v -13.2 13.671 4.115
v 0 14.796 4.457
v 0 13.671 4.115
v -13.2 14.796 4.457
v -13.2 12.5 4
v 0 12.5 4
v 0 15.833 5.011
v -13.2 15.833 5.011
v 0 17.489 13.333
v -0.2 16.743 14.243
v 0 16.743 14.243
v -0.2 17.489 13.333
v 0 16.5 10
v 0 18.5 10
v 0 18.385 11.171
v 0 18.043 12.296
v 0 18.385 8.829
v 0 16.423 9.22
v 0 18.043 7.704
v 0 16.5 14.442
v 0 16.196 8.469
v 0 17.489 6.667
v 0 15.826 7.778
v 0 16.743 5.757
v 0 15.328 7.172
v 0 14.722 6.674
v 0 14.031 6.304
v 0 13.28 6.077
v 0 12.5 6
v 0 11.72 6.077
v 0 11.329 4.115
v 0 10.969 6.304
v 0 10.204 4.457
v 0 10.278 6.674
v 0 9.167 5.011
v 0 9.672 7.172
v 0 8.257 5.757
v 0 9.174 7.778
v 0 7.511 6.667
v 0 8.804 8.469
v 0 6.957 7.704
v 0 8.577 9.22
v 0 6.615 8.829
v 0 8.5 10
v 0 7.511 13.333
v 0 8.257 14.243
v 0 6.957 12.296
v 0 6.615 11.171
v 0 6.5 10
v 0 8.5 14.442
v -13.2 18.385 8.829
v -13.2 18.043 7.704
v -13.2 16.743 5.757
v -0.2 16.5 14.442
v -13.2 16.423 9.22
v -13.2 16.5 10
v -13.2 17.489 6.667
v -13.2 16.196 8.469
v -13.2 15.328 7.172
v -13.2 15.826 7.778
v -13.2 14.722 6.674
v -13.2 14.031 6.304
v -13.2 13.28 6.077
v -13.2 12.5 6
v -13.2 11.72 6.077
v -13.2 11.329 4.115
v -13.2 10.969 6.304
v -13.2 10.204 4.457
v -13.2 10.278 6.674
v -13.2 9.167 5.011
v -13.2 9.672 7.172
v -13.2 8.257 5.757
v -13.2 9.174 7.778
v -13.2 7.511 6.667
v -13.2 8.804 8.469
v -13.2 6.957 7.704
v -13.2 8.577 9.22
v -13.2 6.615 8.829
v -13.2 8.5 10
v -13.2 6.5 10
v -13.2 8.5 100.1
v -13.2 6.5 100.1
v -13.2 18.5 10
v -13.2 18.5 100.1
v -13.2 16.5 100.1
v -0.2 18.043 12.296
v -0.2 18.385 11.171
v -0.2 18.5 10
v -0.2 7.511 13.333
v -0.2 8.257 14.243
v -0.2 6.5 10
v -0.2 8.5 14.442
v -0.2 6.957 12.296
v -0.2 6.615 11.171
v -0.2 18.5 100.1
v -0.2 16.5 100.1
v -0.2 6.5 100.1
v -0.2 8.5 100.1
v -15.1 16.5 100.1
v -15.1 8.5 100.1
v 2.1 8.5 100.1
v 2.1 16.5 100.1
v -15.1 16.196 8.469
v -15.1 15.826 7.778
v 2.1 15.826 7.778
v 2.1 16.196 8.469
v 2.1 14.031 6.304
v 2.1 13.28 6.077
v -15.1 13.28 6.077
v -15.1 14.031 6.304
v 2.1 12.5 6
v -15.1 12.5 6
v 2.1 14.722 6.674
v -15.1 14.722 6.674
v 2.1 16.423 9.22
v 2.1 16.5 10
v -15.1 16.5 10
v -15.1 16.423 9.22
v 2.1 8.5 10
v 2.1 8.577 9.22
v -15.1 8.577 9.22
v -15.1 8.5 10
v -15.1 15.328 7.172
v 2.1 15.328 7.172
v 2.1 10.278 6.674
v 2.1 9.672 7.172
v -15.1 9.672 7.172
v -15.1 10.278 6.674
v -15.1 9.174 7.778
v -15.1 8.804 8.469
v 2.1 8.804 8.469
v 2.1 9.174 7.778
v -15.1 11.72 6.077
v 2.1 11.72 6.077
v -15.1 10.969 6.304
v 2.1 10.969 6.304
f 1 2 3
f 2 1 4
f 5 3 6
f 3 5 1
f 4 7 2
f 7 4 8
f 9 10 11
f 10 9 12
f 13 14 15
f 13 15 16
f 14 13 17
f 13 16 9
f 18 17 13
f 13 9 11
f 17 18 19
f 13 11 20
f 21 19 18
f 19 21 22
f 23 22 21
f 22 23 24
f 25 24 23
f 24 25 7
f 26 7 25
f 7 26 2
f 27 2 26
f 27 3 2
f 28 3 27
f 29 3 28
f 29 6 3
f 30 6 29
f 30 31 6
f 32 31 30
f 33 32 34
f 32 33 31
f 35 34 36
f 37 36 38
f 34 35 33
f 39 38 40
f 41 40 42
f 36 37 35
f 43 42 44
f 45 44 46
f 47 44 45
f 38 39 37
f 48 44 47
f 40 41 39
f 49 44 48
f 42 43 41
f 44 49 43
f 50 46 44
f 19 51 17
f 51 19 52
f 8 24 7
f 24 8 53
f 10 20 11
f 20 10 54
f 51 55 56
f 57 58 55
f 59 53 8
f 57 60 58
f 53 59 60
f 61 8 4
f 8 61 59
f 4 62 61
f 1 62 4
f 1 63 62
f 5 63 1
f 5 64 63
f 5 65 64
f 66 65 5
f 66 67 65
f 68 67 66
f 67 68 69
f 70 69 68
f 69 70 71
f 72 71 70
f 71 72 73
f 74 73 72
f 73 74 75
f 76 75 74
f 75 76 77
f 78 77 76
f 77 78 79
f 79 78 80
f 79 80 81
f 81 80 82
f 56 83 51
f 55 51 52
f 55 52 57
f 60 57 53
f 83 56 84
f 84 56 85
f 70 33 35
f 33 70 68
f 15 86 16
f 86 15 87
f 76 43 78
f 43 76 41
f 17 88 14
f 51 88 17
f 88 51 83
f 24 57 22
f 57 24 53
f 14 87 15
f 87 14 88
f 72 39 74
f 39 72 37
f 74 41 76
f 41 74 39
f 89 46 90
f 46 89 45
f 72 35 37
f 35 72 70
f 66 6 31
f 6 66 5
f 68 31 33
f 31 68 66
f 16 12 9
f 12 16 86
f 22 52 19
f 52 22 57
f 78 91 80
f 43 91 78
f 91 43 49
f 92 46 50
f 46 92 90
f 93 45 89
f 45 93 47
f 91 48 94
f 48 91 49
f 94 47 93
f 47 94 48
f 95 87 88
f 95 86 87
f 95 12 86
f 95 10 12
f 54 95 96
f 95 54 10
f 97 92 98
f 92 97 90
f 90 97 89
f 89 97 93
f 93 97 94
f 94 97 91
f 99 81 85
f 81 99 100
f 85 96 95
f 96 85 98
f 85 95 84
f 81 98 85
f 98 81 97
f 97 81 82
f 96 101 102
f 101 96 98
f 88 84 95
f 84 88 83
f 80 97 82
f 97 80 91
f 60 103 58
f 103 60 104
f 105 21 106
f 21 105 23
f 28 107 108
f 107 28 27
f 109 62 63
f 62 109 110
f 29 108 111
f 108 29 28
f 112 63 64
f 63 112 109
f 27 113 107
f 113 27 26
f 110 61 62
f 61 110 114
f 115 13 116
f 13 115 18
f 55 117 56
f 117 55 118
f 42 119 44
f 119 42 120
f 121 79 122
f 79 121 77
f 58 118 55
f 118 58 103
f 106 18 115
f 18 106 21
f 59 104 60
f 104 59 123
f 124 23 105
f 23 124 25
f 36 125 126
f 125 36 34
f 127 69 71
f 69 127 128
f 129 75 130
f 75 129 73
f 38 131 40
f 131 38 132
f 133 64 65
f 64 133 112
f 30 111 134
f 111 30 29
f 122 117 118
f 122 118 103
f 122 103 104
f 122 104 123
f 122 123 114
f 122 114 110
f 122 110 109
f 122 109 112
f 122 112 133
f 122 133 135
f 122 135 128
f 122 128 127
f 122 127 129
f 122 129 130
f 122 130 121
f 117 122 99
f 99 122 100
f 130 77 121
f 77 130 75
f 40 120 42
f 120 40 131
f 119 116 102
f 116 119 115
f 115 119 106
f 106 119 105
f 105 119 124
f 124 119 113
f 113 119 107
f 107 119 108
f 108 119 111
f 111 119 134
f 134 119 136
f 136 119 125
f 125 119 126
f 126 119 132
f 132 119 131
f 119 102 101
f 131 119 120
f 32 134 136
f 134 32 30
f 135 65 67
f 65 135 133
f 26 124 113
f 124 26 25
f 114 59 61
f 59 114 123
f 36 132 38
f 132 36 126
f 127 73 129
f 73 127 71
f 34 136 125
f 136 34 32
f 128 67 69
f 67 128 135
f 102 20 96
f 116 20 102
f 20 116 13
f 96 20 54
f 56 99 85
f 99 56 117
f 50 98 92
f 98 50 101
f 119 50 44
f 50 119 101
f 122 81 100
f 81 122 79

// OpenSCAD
// file: chassis_base.scad
include <generic/lib.scad>;

function vChassisBaseDatasheet() =
     let(outer_diameter=350, thickness=2, inner_diameter=outer_diameter - 2 * thickness,
         base_height=100, cover_height=20, outer_height=base_height + cover_height,
         inner_height=outer_height - 2 * thickness)
     [["outer_diameter", outer_diameter], ["inner_diameter", inner_diameter],
      ["base_height", base_height], ["height", outer_height],
      ["inner_height", inner_height], ["thickness", thickness],
      ["support_diameter", 10], ["z_offset", 20], ["fillet_radius", 5]];

module mChassisOuterVolume() {
     datasheet = vChassisBaseDatasheet();
     rounded_cylinder(diameter=property(datasheet, "outer_diameter"),
                      height=property(datasheet, "height"),
                      fillet_radius=property(datasheet, "fillet_radius"));
}

module mChassisInnerVolume() {
     datasheet = vChassisBaseDatasheet();
     translate([0, 0, property(datasheet, "thickness")]) {
          rounded_cylinder(diameter=property(datasheet, "inner_diameter"),
                           height=property(datasheet, "inner_height"),
                           fillet_radius=property(datasheet, "fillet_radius"));
     }
}

module mChassisBBox() {
     datasheet = vChassisBaseDatasheet();
     chassis_height = property(datasheet, "height");
     chassis_outer_diameter = property(datasheet, "outer_diameter");
     translate([0., 0., chassis_height/2]) {
          cube([chassis_outer_diameter, chassis_outer_diameter, chassis_height], center=true);
     }
}

module mChassisShell() {
     difference() {
          mChassisOuterVolume();
          mChassisInnerVolume();
     }
}


module mChassisBase() {

}

mChassisBase();
// main file
include <generic/lib.scad>;

use <chassis_base.scad>;

kChassisBaseDatasheet = vChassisBaseDatasheet();

function vBumperSpringBlockBaseDatasheet() =
     let(thickness=property(kChassisBaseDatasheet, "thickness"),
         seat_thickness=3 * thickness, slot_width=5, spring_travel_distance=5,
         spring_max_length=spring_travel_distance + slot_width + 2 * seat_thickness)
     [["height", 20], ["width", 25], ["depth", 40], ["thickness", thickness], ["angular_offset", 70],
      ["spring_outer_diameter", 12], ["spring_inner_diameter", 8], ["spring_lock_size", 2 * thickness],
      ["spring_seat_thickness", seat_thickness], ["spring_slot_width", slot_width],
      ["spring_travel_distance", spring_travel_distance],
      ["spring_max_length", spring_max_length]];


module mBumperSpringBlockSeatComplement() {
     datasheet = vBumperSpringBlockBaseDatasheet();
     height = property(datasheet, "height");
     width = property(datasheet, "width");
     depth = property(datasheet, "depth");
     thickness = property(datasheet, "thickness");
     angular_offset = property(datasheet, "angular_offset");

     spring_outer_diameter = property(datasheet, "spring_outer_diameter");
     spring_inner_diameter = property(datasheet, "spring_inner_diameter");
     spring_lock_size = property(datasheet, "spring_lock_size");
     spring_seat_thickness = property(datasheet, "spring_seat_thickness");
     spring_slot_width = property(datasheet, "spring_slot_width");
     spring_travel_distance = property(datasheet, "spring_travel_distance");
     spring_max_length = property(datasheet, "spring_max_length");

     base_chassis_height = property(kChassisBaseDatasheet, "base_height");

     translate([spring_seat_thickness - spring_lock_size, width/2, height/2]) {
          rotate([0, 90, 0]) {
               translate([0, 0, -(spring_max_length - spring_slot_width) - kEpsilon]) {
                    cylinder(d=spring_inner_diameter, h=spring_max_length - spring_slot_width + 2 * kEpsilon);
                    translate([-(base_chassis_height - height/2) - kEpsilon, -spring_inner_diameter/2, 0]) {
                         cube([base_chassis_height - height/2 + kEpsilon, spring_inner_diameter,
                               spring_max_length - spring_slot_width + 2 * kEpsilon]);
                    }
                    translate([0, 0, spring_seat_thickness - spring_lock_size - kEpsilon]) {
                         cylinder(d=spring_outer_diameter, h=spring_max_length - spring_slot_width - 2 * (spring_seat_thickness - spring_lock_size) + 2 * kEpsilon);
                         translate([-(base_chassis_height - height/2) - kEpsilon, -spring_outer_diameter/2, 0]) {
                              cube([base_chassis_height - height/2 + kEpsilon, spring_outer_diameter,
                                    spring_max_length - spring_slot_width - 2 * (spring_seat_thickness - spring_lock_size)]);
                         }
                    }
               }
          }
     }
}

mBumperSpringBlockSeatComplement();

module mBumperSpringBlockXSection() {
     datasheet = vBumperSpringBlockBaseDatasheet();
     height = property(datasheet, "height");
     width = property(datasheet, "width");
     depth = property(datasheet, "depth");
     thickness = property(datasheet, "thickness");
     angular_offset = property(datasheet, "angular_offset");

     spring_lock_size = property(datasheet, "spring_lock_size");
     spring_seat_thickness = property(datasheet, "spring_seat_thickness");
     spring_slot_width = property(datasheet, "spring_slot_width");
     spring_travel_distance = property(datasheet, "spring_travel_distance");
     spring_max_length = property(datasheet, "spring_max_length");

     chassis_outer_diameter = property(kChassisBaseDatasheet, "outer_diameter");
     difference() {
          translate([-spring_lock_size, width - chassis_outer_diameter/2]) {
               outline(delta=-thickness) {
                    square([depth, chassis_outer_diameter/2]);
               }
               square([spring_seat_thickness, chassis_outer_diameter/2]);
               translate([spring_slot_width + spring_seat_thickness, 0]) {
                    square([depth - spring_slot_width - spring_seat_thickness, chassis_outer_diameter/2]);
               }
               translate([-(spring_max_length - spring_slot_width - 2 * spring_seat_thickness), 0]) {
                    translate([-spring_seat_thickness, 0]) {
                         square([spring_seat_thickness, chassis_outer_diameter/2]);
                    }
               }
          }
          translate([-chassis_outer_diameter/2 * cos(angular_offset), chassis_outer_diameter/2 * sin(angular_offset)]) {
               ring(inner_radius=chassis_outer_diameter/2 - kEpsilon, outer_radius=chassis_outer_diameter);
          }
     }
}

mBumperSpringBlockXSection();
